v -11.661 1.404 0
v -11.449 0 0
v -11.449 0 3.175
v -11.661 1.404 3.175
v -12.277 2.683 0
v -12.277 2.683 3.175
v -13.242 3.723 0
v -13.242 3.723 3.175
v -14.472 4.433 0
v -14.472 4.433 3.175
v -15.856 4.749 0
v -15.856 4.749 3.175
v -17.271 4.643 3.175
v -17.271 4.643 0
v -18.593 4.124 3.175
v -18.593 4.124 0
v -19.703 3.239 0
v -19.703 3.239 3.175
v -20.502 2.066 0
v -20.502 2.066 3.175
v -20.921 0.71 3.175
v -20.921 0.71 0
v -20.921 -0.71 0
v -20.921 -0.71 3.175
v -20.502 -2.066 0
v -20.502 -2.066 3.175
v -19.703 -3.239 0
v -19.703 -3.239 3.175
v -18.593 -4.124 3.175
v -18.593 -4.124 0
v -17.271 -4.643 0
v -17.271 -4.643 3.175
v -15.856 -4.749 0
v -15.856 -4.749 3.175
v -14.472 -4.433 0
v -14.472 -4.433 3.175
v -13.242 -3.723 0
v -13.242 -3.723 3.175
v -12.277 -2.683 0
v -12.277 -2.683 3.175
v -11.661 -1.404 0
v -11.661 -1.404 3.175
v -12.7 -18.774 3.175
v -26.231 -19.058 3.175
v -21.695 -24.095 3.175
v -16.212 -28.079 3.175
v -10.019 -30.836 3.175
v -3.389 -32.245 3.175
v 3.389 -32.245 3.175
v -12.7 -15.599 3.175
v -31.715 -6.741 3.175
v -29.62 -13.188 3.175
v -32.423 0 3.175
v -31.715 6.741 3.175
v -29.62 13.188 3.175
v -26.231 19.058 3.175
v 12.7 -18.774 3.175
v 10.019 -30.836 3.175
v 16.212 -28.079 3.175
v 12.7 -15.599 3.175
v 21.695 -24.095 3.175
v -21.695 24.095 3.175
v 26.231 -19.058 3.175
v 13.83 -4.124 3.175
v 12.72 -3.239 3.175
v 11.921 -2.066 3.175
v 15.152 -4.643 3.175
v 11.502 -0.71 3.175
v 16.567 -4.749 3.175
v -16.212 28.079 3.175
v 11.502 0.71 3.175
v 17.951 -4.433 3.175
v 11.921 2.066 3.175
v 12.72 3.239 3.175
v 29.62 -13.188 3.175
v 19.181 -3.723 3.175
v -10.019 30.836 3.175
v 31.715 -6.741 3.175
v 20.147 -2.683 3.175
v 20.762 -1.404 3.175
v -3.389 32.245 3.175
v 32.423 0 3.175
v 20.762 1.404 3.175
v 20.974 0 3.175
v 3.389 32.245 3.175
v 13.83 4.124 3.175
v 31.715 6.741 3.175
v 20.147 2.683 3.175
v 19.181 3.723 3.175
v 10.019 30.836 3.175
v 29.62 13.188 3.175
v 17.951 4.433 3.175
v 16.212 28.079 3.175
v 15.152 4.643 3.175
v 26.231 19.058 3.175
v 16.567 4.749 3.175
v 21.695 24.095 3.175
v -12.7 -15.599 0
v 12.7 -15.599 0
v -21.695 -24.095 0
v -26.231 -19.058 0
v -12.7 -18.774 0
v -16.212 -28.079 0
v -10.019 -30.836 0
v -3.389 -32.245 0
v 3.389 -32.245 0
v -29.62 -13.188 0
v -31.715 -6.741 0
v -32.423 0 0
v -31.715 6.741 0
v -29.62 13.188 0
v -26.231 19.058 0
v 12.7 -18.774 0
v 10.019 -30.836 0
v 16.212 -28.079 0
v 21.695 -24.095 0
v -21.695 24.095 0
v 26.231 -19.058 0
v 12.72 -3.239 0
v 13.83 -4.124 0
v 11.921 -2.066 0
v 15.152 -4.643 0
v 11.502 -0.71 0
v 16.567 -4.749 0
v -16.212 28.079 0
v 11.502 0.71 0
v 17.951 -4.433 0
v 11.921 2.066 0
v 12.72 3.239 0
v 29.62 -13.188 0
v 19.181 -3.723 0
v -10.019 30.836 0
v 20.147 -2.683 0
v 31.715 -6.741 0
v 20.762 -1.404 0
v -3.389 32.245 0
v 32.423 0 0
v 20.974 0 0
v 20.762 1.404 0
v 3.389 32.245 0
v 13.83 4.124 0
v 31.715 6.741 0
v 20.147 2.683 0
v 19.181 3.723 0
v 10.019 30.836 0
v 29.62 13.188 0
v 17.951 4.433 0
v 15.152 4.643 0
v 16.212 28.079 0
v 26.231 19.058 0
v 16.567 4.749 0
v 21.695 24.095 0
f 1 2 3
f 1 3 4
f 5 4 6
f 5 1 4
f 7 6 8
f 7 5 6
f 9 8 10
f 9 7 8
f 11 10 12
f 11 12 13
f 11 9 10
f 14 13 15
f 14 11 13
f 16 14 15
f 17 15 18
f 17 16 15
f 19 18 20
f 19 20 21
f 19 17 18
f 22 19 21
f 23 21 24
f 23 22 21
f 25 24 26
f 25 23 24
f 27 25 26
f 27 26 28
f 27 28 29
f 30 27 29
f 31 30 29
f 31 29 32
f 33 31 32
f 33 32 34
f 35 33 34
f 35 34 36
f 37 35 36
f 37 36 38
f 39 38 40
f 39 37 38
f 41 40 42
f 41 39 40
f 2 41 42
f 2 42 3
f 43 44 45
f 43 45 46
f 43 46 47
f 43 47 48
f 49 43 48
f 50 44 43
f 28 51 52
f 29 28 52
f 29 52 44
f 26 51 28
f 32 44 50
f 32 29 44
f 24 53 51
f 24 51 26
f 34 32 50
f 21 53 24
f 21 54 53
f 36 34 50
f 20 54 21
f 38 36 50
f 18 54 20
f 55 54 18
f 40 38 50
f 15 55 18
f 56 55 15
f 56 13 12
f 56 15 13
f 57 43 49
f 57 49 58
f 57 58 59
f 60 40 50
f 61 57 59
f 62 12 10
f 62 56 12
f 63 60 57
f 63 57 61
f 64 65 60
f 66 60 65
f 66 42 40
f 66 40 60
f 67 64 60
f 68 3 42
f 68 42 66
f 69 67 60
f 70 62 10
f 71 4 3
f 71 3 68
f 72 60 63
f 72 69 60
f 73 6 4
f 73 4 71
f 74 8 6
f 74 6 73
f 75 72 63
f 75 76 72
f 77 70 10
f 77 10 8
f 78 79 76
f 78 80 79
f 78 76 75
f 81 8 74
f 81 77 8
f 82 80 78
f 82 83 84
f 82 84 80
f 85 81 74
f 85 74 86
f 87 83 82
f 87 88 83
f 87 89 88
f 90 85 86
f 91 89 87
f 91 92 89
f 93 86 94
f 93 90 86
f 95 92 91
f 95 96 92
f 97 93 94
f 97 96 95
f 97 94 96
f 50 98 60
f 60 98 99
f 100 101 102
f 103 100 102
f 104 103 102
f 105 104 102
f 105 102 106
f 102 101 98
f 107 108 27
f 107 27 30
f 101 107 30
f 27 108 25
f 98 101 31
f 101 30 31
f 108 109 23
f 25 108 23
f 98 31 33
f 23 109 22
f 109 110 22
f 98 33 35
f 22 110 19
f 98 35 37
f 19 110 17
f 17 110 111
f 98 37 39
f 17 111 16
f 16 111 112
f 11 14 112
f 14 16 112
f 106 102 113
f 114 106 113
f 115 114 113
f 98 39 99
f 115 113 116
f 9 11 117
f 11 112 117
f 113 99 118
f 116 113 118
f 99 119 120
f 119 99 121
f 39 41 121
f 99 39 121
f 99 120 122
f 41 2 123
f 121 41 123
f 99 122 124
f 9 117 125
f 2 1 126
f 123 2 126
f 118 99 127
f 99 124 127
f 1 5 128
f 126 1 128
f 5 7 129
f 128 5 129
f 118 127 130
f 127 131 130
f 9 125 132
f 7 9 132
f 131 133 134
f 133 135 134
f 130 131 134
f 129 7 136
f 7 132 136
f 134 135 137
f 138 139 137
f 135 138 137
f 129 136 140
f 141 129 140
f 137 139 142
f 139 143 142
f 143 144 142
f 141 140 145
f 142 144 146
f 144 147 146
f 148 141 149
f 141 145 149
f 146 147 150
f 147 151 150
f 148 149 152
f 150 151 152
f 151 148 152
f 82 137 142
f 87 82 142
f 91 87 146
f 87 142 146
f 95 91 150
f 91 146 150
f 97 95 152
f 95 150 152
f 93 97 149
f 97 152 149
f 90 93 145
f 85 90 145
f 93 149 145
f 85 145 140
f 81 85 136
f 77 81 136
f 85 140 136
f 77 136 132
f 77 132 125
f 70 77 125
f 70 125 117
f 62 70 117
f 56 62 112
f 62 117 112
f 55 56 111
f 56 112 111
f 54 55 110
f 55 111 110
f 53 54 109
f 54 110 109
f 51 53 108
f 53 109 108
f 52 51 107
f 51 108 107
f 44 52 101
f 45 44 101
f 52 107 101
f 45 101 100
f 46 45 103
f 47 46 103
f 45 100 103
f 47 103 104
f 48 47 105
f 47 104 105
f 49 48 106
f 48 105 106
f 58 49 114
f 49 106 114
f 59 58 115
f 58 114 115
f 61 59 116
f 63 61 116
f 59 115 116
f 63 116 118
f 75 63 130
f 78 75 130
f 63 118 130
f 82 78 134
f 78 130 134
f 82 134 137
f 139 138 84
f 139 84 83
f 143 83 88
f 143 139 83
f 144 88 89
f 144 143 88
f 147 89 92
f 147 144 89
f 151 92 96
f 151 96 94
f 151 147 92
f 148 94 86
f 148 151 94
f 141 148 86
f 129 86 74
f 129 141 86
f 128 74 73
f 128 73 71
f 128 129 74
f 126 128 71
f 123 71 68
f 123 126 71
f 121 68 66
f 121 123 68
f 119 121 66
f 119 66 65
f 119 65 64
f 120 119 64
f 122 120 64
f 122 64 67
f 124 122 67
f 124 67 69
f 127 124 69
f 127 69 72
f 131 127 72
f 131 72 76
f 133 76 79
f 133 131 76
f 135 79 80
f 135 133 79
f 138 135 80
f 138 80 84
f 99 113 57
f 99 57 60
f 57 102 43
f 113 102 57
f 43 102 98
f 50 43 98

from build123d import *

# Parameters (mm, degrees)
F0_R     = 32.4231
F0_W     = 25.4
F0_H     = 3.175
F0_R_2   = 4.7625
F1_DEPTH = 3.175


with BuildPart() as f1:
    # F0 (on Top) → F1 (new body)
    with BuildSketch(Plane.XY):
        Circle(F0_R)
        with Locations((0, -17.18679)):
            Rectangle(F0_W, F0_H, mode=Mode.SUBTRACT)
        with Locations((-16.21155, 0)):
            Circle(F0_R_2, mode=Mode.SUBTRACT)
        with Locations((16.21155, 0)):
            Circle(F0_R_2, mode=Mode.SUBTRACT)
    extrude(amount=F1_DEPTH)


solid = f1.part
